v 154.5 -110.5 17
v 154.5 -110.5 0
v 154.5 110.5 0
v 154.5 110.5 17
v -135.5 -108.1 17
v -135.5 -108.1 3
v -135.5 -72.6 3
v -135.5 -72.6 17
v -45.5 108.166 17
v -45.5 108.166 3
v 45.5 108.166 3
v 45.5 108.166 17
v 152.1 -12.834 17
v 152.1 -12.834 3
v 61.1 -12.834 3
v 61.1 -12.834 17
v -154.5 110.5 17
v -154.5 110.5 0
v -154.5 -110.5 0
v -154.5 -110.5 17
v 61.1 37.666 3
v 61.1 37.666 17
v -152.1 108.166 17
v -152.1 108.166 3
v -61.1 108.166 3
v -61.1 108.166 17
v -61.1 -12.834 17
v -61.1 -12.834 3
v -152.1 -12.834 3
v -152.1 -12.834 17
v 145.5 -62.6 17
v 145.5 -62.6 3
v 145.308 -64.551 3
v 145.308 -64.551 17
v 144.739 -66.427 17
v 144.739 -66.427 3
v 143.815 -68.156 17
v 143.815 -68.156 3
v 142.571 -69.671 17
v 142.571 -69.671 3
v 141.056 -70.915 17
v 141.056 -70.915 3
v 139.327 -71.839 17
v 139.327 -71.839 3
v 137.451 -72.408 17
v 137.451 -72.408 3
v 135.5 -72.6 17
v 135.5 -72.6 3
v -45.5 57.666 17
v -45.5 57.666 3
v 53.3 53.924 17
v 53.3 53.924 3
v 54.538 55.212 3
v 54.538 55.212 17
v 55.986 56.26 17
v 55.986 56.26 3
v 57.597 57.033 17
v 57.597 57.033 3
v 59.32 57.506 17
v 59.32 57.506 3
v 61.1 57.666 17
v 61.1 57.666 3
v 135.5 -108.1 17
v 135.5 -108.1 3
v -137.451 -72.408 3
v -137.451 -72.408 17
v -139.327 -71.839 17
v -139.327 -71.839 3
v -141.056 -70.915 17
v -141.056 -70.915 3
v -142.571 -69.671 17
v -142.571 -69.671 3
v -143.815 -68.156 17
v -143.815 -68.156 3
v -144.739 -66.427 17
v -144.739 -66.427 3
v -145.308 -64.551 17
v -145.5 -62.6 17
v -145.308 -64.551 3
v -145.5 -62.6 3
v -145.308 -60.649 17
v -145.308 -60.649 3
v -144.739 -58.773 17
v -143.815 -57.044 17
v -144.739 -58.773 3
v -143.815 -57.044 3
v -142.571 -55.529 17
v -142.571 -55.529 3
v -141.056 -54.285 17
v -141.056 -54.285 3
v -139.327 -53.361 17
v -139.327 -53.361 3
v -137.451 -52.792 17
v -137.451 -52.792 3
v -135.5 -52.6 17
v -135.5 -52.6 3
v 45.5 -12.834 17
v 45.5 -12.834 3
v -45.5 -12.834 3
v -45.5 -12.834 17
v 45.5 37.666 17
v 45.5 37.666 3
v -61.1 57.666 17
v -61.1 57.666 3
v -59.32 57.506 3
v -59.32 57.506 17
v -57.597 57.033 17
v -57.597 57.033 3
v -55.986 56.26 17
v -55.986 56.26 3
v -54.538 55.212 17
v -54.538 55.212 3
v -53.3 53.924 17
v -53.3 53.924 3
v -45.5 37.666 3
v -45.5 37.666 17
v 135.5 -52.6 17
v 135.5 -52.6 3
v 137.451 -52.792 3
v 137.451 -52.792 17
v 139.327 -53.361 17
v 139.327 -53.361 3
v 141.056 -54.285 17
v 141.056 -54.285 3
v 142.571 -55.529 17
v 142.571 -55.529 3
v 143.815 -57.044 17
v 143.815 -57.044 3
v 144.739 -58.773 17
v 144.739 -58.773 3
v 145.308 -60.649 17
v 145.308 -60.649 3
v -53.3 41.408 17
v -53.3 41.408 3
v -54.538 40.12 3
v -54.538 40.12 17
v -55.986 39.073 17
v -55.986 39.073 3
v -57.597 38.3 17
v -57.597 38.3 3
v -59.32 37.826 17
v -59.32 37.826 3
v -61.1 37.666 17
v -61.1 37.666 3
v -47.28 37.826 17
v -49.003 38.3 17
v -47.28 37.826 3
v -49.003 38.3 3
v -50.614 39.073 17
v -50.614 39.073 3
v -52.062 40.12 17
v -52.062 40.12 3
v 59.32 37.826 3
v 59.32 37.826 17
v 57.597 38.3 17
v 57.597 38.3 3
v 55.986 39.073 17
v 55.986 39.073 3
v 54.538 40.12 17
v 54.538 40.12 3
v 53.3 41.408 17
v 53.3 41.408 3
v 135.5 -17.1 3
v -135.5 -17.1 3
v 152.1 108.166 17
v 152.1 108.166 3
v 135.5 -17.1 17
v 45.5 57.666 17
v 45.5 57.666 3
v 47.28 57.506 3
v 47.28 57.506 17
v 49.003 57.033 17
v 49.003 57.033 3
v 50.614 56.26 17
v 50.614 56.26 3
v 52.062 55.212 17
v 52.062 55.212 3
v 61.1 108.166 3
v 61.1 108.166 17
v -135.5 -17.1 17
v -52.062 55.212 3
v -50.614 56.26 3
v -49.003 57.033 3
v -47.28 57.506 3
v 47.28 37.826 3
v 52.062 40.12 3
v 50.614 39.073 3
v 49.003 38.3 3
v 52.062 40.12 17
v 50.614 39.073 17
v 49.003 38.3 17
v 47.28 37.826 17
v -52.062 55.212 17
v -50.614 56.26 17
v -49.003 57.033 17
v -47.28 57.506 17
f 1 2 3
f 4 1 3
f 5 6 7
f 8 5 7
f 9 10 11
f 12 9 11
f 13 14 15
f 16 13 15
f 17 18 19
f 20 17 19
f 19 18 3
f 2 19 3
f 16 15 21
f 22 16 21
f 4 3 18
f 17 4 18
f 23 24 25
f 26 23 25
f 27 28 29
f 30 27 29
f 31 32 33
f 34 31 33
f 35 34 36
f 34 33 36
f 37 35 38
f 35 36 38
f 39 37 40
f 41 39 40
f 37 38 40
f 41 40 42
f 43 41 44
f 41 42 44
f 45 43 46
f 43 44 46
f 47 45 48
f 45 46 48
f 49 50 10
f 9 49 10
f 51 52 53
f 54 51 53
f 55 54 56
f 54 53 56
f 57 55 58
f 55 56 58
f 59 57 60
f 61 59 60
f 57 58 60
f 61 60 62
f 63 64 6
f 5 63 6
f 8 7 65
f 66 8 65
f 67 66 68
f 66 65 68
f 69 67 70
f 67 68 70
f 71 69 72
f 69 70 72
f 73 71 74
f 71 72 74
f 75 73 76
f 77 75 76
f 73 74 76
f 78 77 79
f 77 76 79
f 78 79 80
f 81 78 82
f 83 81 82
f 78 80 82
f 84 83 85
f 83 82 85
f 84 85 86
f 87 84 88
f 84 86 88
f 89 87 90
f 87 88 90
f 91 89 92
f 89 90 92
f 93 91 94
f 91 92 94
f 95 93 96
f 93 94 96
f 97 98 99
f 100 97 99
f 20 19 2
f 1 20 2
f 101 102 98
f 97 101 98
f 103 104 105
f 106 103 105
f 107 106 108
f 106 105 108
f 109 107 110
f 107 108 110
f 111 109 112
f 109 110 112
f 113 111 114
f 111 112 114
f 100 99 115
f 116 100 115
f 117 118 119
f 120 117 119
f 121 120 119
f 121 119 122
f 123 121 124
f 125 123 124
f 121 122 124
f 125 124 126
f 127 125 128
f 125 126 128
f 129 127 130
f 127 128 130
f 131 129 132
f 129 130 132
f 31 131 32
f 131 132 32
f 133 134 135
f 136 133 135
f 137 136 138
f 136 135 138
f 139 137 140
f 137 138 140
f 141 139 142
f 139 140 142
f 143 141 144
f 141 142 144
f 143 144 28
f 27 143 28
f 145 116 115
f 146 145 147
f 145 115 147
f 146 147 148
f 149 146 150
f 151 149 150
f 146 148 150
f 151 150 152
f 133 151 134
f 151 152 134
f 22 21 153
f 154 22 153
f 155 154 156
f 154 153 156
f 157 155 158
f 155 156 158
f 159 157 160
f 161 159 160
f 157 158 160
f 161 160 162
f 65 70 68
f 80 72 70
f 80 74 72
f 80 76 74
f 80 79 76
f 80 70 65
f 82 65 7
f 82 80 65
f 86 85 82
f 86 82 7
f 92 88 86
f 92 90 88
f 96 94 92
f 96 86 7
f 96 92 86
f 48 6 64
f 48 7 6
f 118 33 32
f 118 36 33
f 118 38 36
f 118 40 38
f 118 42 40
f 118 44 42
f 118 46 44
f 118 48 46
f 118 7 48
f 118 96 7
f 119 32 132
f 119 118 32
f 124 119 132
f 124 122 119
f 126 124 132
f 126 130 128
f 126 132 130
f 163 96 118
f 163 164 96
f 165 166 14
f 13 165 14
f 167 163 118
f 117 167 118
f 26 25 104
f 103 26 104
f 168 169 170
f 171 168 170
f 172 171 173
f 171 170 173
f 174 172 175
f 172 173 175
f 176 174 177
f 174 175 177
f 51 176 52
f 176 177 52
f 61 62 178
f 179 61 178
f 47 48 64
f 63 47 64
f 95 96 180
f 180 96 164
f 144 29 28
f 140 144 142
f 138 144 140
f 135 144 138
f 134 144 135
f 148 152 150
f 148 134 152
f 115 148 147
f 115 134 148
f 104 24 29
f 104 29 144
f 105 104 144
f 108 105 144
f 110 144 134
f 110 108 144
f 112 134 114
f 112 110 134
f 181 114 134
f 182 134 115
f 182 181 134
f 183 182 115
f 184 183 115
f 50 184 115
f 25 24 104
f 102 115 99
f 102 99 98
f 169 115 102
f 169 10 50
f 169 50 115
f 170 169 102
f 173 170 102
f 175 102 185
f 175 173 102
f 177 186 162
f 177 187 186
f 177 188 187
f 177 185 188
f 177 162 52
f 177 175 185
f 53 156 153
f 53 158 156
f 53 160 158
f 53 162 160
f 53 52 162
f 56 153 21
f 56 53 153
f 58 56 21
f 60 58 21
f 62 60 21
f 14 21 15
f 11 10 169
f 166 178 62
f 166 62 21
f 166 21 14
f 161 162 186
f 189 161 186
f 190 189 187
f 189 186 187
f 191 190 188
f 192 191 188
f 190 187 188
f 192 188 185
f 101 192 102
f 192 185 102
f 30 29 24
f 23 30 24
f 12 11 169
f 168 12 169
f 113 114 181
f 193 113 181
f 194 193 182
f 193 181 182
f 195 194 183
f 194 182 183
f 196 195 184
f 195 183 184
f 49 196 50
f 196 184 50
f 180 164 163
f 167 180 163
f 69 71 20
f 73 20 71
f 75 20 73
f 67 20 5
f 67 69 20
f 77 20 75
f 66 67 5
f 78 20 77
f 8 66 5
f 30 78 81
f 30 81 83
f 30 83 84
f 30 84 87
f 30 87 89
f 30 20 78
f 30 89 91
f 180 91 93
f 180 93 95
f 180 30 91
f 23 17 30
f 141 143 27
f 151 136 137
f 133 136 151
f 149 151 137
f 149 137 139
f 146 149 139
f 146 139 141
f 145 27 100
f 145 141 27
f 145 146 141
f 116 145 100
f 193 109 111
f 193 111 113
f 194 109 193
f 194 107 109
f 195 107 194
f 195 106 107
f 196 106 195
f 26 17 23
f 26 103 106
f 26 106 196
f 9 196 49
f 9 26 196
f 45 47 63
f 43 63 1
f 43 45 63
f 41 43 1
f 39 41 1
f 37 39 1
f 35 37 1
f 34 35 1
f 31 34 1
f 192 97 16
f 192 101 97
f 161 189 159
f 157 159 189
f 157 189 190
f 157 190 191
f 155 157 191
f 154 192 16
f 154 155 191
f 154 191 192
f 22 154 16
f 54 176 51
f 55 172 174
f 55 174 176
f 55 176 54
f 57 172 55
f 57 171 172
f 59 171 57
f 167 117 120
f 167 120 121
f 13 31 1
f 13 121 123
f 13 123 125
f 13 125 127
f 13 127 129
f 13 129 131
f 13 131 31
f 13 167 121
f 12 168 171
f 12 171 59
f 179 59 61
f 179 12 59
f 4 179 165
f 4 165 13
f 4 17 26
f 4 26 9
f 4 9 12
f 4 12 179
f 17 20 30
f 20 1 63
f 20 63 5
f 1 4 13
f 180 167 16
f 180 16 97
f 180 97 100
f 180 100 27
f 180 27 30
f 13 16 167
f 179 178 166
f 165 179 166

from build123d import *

# Parameters (mm, degrees)
F1_DEPTH = 3
F2_DEPTH = 17


# Not quite as in the source:
# - ends of sketch curves that miss each other by under 0.0002 mm in the source are joined


with BuildPart() as f1:
    # F0 (on Top) → F1 (new body)
    with BuildSketch(Plane.XY):
        Polygon((154.5, 110.5), (-154.5, 110.5), (-154.4999927282, -110.5), (154.5, -110.5), align=None)
        with BuildLine():
            Line((135.5, -108.0998892117), (-135.5, -108.0998892117))
            Line((-135.5, -108.0998892117), (-135.5, -72.5998892117))
            ThreePointArc((-135.5, -72.5998892117), (-145.5, -62.5998892117), (-135.5, -52.5998892117))
            Line((-135.5, -52.5998892117), (-135.5, -17.0998892117))
            Line((-135.5, -17.0998892117), (135.5, -17.0998892117))
            Line((135.5, -17.0998892117), (135.5, -52.5998892117))
            ThreePointArc((135.5, -52.5998892117), (142.5710678119, -55.5288213998), (145.5, -62.5998892117))
            ThreePointArc((145.5, -62.5998892117), (142.5710678119, -69.6709570235), (135.5, -72.5998892117))
            Line((135.5, -72.5998892117), (135.5, -108.0998892117))
        make_face(mode=Mode.SUBTRACT)
        with BuildLine():
            Line((-45.4999990761, 57.6660784096), (-45.4999990761, 108.1660784096))
            Line((-45.4999990761, 108.1660784096), (45.5000009239, 108.1660784096))
            Line((45.5000009239, 108.1660784096), (45.5000009239, 57.6660784096))
            ThreePointArc((45.5000009239, 57.6660784096), (49.8255857676, 56.6821371804), (53.2999463577, 53.9239415616))
            ThreePointArc((53.2999463577, 53.9239415616), (56.7743069478, 56.6821371804), (61.0998917915, 57.6660784096))
            Line((61.0998917915, 57.6660784096), (61.0998917915, 108.1660784096))
            Line((61.0998917915, 108.1660784096), (152.0998917915, 108.1660784096))
            Line((152.0998917915, 108.1660784096), (152.0998917915, -12.8339215904))
            Line((152.0998917915, -12.8339215904), (61.0998917915, -12.8339215904))
            Line((61.0998917915, -12.8339215904), (61.0998917915, 37.6660784096))
            ThreePointArc((61.0998917915, 37.6660784096), (56.7743069478, 38.6500196387), (53.2999463577, 41.4082152575))
            ThreePointArc((53.2999463577, 41.4082152575), (49.8255857676, 38.6500196387), (45.5000009239, 37.6660784096))
            Line((45.5000009239, 37.6660784096), (45.5000009239, -12.8339215904))
            Line((45.5000009239, -12.8339215904), (-45.4999990761, -12.8339215904))
            Line((-45.4999990761, -12.8339215904), (-45.4999990761, 37.6660784096))
            ThreePointArc((-45.4999990761, 37.6660784096), (-49.8257290565, 38.6500892715), (-53.3001459795, 41.4084663822))
            ThreePointArc((-53.3001459795, 41.4084663822), (-56.7745629026, 38.6500892715), (-61.1002928829, 37.6660784096))
            Line((-61.1002928829, 37.6660784096), (-61.1002928829, -12.8339215904))
            Line((-61.1002928829, -12.8339215904), (-152.1002928829, -12.8339215904))
            Line((-152.1002928829, -12.8339215904), (-152.1002928829, 108.1660784096))
            Line((-152.1002928829, 108.1660784096), (-61.1002928829, 108.1660784096))
            Line((-61.1002928829, 108.1660784096), (-61.1002928829, 57.6660784096))
            ThreePointArc((-61.1002928829, 57.6660784096), (-56.7745629026, 56.6820675476), (-53.3001459795, 53.923690437))
            ThreePointArc((-53.3001459795, 53.923690437), (-49.8257290565, 56.6820675476), (-45.4999990761, 57.6660784096))
        make_face(mode=Mode.SUBTRACT)
        with BuildLine():
            Line((-135.5, -72.5998892117), (-135.5, -108.0998892117))
            Line((-135.5, -108.0998892117), (135.5, -108.0998892117))
            Line((135.5, -108.0998892117), (135.5, -72.5998892117))
            ThreePointArc((135.5, -72.5998892117), (125.5, -62.5998892117), (135.5, -52.5998892117))
            Line((135.5, -52.5998892117), (135.5, -17.0998892117))
            Line((135.5, -17.0998892117), (-135.5, -17.0998892117))
            Line((-135.5, -17.0998892117), (-135.5, -52.5998892117))
            ThreePointArc((-135.5, -52.5998892117), (-128.4289321881, -55.5288213998), (-125.5, -62.5998892117))
            ThreePointArc((-125.5, -62.5998892117), (-128.4289321881, -69.6709570235), (-135.5, -72.5998892117))
        make_face()
        with BuildLine():
            ThreePointArc((-61.1002928829, 37.6660784096), (-71.1002928829, 47.6660784096), (-61.1002928829, 57.6660784096))
            Line((-61.1002928829, 57.6660784096), (-61.1002928829, 108.1660784096))
            Line((-61.1002928829, 108.1660784096), (-152.1002928829, 108.1660784096))
            Line((-152.1002928829, 108.1660784096), (-152.1002928829, -12.8339215904))
            Line((-152.1002928829, -12.8339215904), (-61.1002928829, -12.8339215904))
            Line((-61.1002928829, -12.8339215904), (-61.1002928829, 37.6660784096))
        make_face()
        with BuildLine():
            Line((61.0998917915, 108.1660784096), (61.0998917915, 57.6660784096))
            ThreePointArc((61.0998917915, 57.6660784096), (68.1709596034, 54.7371462214), (71.0998917915, 47.6660784096))
            ThreePointArc((71.0998917915, 47.6660784096), (68.1709596034, 40.5950105977), (61.0998917915, 37.6660784096))
            Line((61.0998917915, 37.6660784096), (61.0998917915, -12.8339215904))
            Line((61.0998917915, -12.8339215904), (152.0998917915, -12.8339215904))
            Line((152.0998917915, -12.8339215904), (152.0998917915, 108.1660784096))
            Line((152.0998917915, 108.1660784096), (61.0998917915, 108.1660784096))
        make_face()
        with BuildLine():
            Line((45.5000009239, 108.1660784096), (-45.4999990761, 108.1660784096))
            Line((-45.4999990761, 108.1660784096), (-45.4999990761, 57.6660784096))
            ThreePointArc((-45.4999990761, 57.6660784096), (-38.4289312643, 54.7371462214), (-35.4999990761, 47.6660784096))
            ThreePointArc((-35.4999990761, 47.6660784096), (-38.4289312643, 40.5950105977), (-45.4999990761, 37.6660784096))
            Line((-45.4999990761, 37.6660784096), (-45.4999990761, -12.8339215904))
            Line((-45.4999990761, -12.8339215904), (45.5000009239, -12.8339215904))
            Line((45.5000009239, -12.8339215904), (45.5000009239, 37.6660784096))
            ThreePointArc((45.5000009239, 37.6660784096), (35.5000009239, 47.6660784096), (45.5000009239, 57.6660784096))
            Line((45.5000009239, 57.6660784096), (45.5000009239, 108.1660784096))
        make_face()
        with BuildLine():
            Line((-61.1002928829, 37.6660784096), (-61.1002928829, 57.6660784096))
            ThreePointArc((-61.1002928829, 57.6660784096), (-71.1002928829, 47.6660784096), (-61.1002928829, 37.6660784096))
        make_face()
        with BuildLine():
            Line((45.5000009239, 37.6660784096), (45.5000009239, 57.6660784096))
            ThreePointArc((45.5000009239, 57.6660784096), (35.5000009239, 47.6660784096), (45.5000009239, 37.6660784096))
        make_face()
        with BuildLine():
            ThreePointArc((71.0998917915, 47.6660784096), (68.1709596034, 54.7371462214), (61.0998917915, 57.6660784096))
            Line((61.0998917915, 57.6660784096), (61.0998917915, 37.6660784096))
            ThreePointArc((61.0998917915, 37.6660784096), (68.1709596034, 40.5950105977), (71.0998917915, 47.6660784096))
        make_face()
        with BuildLine():
            Line((135.5, -52.5998892117), (135.5, -72.5998892117))
            ThreePointArc((135.5, -72.5998892117), (142.5710678119, -69.6709570235), (145.5, -62.5998892117))
            ThreePointArc((145.5, -62.5998892117), (142.5710678119, -55.5288213998), (135.5, -52.5998892117))
        make_face()
        with BuildLine():
            ThreePointArc((-35.4999990761, 47.6660784096), (-38.4289312643, 54.7371462214), (-45.4999990761, 57.6660784096))
            Line((-45.4999990761, 57.6660784096), (-45.4999990761, 37.6660784096))
            ThreePointArc((-45.4999990761, 37.6660784096), (-38.4289312643, 40.5950105977), (-35.4999990761, 47.6660784096))
        make_face()
        with BuildLine():
            ThreePointArc((135.5, -52.5998892117), (125.5, -62.5998892117), (135.5, -72.5998892117))
            Line((135.5, -72.5998892117), (135.5, -52.5998892117))
        make_face()
        with BuildLine():
            Line((-135.5, -52.5998892117), (-135.5, -72.5998892117))
            ThreePointArc((-135.5, -72.5998892117), (-128.4289321881, -69.6709570235), (-125.5, -62.5998892117))
            ThreePointArc((-125.5, -62.5998892117), (-128.4289321881, -55.5288213998), (-135.5, -52.5998892117))
        make_face()
        with BuildLine():
            ThreePointArc((-135.5, -52.5998892117), (-145.5, -62.5998892117), (-135.5, -72.5998892117))
            Line((-135.5, -72.5998892117), (-135.5, -52.5998892117))
        make_face()
        with BuildLine():
            Line((-45.4999990761, 37.6660784096), (-45.4999990761, 57.6660784096))
            ThreePointArc((-45.4999990761, 57.6660784096), (-49.8257290565, 56.6820675476), (-53.3001459795, 53.923690437))
            ThreePointArc((-53.3001459795, 53.923690437), (-51.6662728216, 50.9825924655), (-51.1002928829, 47.6660784096))
            ThreePointArc((-51.1002928829, 47.6660784096), (-51.6662728216, 44.3495643536), (-53.3001459795, 41.4084663822))
            ThreePointArc((-53.3001459795, 41.4084663822), (-49.8257290565, 38.6500892715), (-45.4999990761, 37.6660784096))
        make_face()
        with BuildLine():
            ThreePointArc((-53.3001459795, 41.4084663822), (-55.4999990761, 47.6660784096), (-53.3001459795, 53.923690437))
            ThreePointArc((-53.3001459795, 53.923690437), (-56.7745629026, 56.6820675476), (-61.1002928829, 57.6660784096))
            Line((-61.1002928829, 57.6660784096), (-61.1002928829, 37.6660784096))
            ThreePointArc((-61.1002928829, 37.6660784096), (-56.7745629026, 38.6500892715), (-53.3001459795, 41.4084663822))
        make_face()
        with BuildLine():
            ThreePointArc((61.0998917915, 57.6660784096), (56.7743069478, 56.6821371804), (53.2999463577, 53.9239415616))
            ThreePointArc((53.2999463577, 53.9239415616), (54.9339675959, 50.9827443305), (55.5000009239, 47.6660784096))
            ThreePointArc((55.5000009239, 47.6660784096), (54.9339675959, 44.3494124887), (53.2999463577, 41.4082152575))
            ThreePointArc((53.2999463577, 41.4082152575), (56.7743069478, 38.6500196387), (61.0998917915, 37.6660784096))
            Line((61.0998917915, 37.6660784096), (61.0998917915, 57.6660784096))
        make_face()
        with BuildLine():
            ThreePointArc((53.2999463577, 53.9239415616), (49.8255857676, 56.6821371804), (45.5000009239, 57.6660784096))
            Line((45.5000009239, 57.6660784096), (45.5000009239, 37.6660784096))
            ThreePointArc((45.5000009239, 37.6660784096), (49.8255857676, 38.6500196387), (53.2999463577, 41.4082152575))
            ThreePointArc((53.2999463577, 41.4082152575), (51.0998917915, 47.6660784096), (53.2999463577, 53.9239415616))
        make_face()
        with BuildLine():
            ThreePointArc((55.5000009239, 47.6660784096), (54.9339675959, 50.9827443305), (53.2999463577, 53.9239415616))
            ThreePointArc((53.2999463577, 53.9239415616), (51.0998917915, 47.6660784096), (53.2999463577, 41.4082152575))
            ThreePointArc((53.2999463577, 41.4082152575), (54.9339675959, 44.3494124887), (55.5000009239, 47.6660784096))
        make_face()
        with BuildLine():
            ThreePointArc((-51.1002928829, 47.6660784096), (-51.6662728216, 50.9825924655), (-53.3001459795, 53.923690437))
            ThreePointArc((-53.3001459795, 53.923690437), (-55.4999990761, 47.6660784096), (-53.3001459795, 41.4084663822))
            ThreePointArc((-53.3001459795, 41.4084663822), (-51.6662728216, 44.3495643536), (-51.1002928829, 47.6660784096))
        make_face()
    extrude(amount=F1_DEPTH)

    # F0 (on Top) → F2 (join)
    with BuildSketch(Plane.XY):
        Polygon((154.5, 110.5), (-154.5, 110.5), (-154.4999927282, -110.5), (154.5, -110.5), align=None)
        with BuildLine():
            Line((135.5, -108.0998892117), (-135.5, -108.0998892117))
            Line((-135.5, -108.0998892117), (-135.5, -72.5998892117))
            ThreePointArc((-135.5, -72.5998892117), (-145.5, -62.5998892117), (-135.5, -52.5998892117))
            Line((-135.5, -52.5998892117), (-135.5, -17.0998892117))
            Line((-135.5, -17.0998892117), (135.5, -17.0998892117))
            Line((135.5, -17.0998892117), (135.5, -52.5998892117))
            ThreePointArc((135.5, -52.5998892117), (142.5710678119, -55.5288213998), (145.5, -62.5998892117))
            ThreePointArc((145.5, -62.5998892117), (142.5710678119, -69.6709570235), (135.5, -72.5998892117))
            Line((135.5, -72.5998892117), (135.5, -108.0998892117))
        make_face(mode=Mode.SUBTRACT)
        with BuildLine():
            Line((-45.4999990761, 57.6660784096), (-45.4999990761, 108.1660784096))
            Line((-45.4999990761, 108.1660784096), (45.5000009239, 108.1660784096))
            Line((45.5000009239, 108.1660784096), (45.5000009239, 57.6660784096))
            ThreePointArc((45.5000009239, 57.6660784096), (49.8255857676, 56.6821371804), (53.2999463577, 53.9239415616))
            ThreePointArc((53.2999463577, 53.9239415616), (56.7743069478, 56.6821371804), (61.0998917915, 57.6660784096))
            Line((61.0998917915, 57.6660784096), (61.0998917915, 108.1660784096))
            Line((61.0998917915, 108.1660784096), (152.0998917915, 108.1660784096))
            Line((152.0998917915, 108.1660784096), (152.0998917915, -12.8339215904))
            Line((152.0998917915, -12.8339215904), (61.0998917915, -12.8339215904))
            Line((61.0998917915, -12.8339215904), (61.0998917915, 37.6660784096))
            ThreePointArc((61.0998917915, 37.6660784096), (56.7743069478, 38.6500196387), (53.2999463577, 41.4082152575))
            ThreePointArc((53.2999463577, 41.4082152575), (49.8255857676, 38.6500196387), (45.5000009239, 37.6660784096))
            Line((45.5000009239, 37.6660784096), (45.5000009239, -12.8339215904))
            Line((45.5000009239, -12.8339215904), (-45.4999990761, -12.8339215904))
            Line((-45.4999990761, -12.8339215904), (-45.4999990761, 37.6660784096))
            ThreePointArc((-45.4999990761, 37.6660784096), (-49.8257290565, 38.6500892715), (-53.3001459795, 41.4084663822))
            ThreePointArc((-53.3001459795, 41.4084663822), (-56.7745629026, 38.6500892715), (-61.1002928829, 37.6660784096))
            Line((-61.1002928829, 37.6660784096), (-61.1002928829, -12.8339215904))
            Line((-61.1002928829, -12.8339215904), (-152.1002928829, -12.8339215904))
            Line((-152.1002928829, -12.8339215904), (-152.1002928829, 108.1660784096))
            Line((-152.1002928829, 108.1660784096), (-61.1002928829, 108.1660784096))
            Line((-61.1002928829, 108.1660784096), (-61.1002928829, 57.6660784096))
            ThreePointArc((-61.1002928829, 57.6660784096), (-56.7745629026, 56.6820675476), (-53.3001459795, 53.923690437))
            ThreePointArc((-53.3001459795, 53.923690437), (-49.8257290565, 56.6820675476), (-45.4999990761, 57.6660784096))
        make_face(mode=Mode.SUBTRACT)
    extrude(amount=F2_DEPTH)


solid = f1.part
